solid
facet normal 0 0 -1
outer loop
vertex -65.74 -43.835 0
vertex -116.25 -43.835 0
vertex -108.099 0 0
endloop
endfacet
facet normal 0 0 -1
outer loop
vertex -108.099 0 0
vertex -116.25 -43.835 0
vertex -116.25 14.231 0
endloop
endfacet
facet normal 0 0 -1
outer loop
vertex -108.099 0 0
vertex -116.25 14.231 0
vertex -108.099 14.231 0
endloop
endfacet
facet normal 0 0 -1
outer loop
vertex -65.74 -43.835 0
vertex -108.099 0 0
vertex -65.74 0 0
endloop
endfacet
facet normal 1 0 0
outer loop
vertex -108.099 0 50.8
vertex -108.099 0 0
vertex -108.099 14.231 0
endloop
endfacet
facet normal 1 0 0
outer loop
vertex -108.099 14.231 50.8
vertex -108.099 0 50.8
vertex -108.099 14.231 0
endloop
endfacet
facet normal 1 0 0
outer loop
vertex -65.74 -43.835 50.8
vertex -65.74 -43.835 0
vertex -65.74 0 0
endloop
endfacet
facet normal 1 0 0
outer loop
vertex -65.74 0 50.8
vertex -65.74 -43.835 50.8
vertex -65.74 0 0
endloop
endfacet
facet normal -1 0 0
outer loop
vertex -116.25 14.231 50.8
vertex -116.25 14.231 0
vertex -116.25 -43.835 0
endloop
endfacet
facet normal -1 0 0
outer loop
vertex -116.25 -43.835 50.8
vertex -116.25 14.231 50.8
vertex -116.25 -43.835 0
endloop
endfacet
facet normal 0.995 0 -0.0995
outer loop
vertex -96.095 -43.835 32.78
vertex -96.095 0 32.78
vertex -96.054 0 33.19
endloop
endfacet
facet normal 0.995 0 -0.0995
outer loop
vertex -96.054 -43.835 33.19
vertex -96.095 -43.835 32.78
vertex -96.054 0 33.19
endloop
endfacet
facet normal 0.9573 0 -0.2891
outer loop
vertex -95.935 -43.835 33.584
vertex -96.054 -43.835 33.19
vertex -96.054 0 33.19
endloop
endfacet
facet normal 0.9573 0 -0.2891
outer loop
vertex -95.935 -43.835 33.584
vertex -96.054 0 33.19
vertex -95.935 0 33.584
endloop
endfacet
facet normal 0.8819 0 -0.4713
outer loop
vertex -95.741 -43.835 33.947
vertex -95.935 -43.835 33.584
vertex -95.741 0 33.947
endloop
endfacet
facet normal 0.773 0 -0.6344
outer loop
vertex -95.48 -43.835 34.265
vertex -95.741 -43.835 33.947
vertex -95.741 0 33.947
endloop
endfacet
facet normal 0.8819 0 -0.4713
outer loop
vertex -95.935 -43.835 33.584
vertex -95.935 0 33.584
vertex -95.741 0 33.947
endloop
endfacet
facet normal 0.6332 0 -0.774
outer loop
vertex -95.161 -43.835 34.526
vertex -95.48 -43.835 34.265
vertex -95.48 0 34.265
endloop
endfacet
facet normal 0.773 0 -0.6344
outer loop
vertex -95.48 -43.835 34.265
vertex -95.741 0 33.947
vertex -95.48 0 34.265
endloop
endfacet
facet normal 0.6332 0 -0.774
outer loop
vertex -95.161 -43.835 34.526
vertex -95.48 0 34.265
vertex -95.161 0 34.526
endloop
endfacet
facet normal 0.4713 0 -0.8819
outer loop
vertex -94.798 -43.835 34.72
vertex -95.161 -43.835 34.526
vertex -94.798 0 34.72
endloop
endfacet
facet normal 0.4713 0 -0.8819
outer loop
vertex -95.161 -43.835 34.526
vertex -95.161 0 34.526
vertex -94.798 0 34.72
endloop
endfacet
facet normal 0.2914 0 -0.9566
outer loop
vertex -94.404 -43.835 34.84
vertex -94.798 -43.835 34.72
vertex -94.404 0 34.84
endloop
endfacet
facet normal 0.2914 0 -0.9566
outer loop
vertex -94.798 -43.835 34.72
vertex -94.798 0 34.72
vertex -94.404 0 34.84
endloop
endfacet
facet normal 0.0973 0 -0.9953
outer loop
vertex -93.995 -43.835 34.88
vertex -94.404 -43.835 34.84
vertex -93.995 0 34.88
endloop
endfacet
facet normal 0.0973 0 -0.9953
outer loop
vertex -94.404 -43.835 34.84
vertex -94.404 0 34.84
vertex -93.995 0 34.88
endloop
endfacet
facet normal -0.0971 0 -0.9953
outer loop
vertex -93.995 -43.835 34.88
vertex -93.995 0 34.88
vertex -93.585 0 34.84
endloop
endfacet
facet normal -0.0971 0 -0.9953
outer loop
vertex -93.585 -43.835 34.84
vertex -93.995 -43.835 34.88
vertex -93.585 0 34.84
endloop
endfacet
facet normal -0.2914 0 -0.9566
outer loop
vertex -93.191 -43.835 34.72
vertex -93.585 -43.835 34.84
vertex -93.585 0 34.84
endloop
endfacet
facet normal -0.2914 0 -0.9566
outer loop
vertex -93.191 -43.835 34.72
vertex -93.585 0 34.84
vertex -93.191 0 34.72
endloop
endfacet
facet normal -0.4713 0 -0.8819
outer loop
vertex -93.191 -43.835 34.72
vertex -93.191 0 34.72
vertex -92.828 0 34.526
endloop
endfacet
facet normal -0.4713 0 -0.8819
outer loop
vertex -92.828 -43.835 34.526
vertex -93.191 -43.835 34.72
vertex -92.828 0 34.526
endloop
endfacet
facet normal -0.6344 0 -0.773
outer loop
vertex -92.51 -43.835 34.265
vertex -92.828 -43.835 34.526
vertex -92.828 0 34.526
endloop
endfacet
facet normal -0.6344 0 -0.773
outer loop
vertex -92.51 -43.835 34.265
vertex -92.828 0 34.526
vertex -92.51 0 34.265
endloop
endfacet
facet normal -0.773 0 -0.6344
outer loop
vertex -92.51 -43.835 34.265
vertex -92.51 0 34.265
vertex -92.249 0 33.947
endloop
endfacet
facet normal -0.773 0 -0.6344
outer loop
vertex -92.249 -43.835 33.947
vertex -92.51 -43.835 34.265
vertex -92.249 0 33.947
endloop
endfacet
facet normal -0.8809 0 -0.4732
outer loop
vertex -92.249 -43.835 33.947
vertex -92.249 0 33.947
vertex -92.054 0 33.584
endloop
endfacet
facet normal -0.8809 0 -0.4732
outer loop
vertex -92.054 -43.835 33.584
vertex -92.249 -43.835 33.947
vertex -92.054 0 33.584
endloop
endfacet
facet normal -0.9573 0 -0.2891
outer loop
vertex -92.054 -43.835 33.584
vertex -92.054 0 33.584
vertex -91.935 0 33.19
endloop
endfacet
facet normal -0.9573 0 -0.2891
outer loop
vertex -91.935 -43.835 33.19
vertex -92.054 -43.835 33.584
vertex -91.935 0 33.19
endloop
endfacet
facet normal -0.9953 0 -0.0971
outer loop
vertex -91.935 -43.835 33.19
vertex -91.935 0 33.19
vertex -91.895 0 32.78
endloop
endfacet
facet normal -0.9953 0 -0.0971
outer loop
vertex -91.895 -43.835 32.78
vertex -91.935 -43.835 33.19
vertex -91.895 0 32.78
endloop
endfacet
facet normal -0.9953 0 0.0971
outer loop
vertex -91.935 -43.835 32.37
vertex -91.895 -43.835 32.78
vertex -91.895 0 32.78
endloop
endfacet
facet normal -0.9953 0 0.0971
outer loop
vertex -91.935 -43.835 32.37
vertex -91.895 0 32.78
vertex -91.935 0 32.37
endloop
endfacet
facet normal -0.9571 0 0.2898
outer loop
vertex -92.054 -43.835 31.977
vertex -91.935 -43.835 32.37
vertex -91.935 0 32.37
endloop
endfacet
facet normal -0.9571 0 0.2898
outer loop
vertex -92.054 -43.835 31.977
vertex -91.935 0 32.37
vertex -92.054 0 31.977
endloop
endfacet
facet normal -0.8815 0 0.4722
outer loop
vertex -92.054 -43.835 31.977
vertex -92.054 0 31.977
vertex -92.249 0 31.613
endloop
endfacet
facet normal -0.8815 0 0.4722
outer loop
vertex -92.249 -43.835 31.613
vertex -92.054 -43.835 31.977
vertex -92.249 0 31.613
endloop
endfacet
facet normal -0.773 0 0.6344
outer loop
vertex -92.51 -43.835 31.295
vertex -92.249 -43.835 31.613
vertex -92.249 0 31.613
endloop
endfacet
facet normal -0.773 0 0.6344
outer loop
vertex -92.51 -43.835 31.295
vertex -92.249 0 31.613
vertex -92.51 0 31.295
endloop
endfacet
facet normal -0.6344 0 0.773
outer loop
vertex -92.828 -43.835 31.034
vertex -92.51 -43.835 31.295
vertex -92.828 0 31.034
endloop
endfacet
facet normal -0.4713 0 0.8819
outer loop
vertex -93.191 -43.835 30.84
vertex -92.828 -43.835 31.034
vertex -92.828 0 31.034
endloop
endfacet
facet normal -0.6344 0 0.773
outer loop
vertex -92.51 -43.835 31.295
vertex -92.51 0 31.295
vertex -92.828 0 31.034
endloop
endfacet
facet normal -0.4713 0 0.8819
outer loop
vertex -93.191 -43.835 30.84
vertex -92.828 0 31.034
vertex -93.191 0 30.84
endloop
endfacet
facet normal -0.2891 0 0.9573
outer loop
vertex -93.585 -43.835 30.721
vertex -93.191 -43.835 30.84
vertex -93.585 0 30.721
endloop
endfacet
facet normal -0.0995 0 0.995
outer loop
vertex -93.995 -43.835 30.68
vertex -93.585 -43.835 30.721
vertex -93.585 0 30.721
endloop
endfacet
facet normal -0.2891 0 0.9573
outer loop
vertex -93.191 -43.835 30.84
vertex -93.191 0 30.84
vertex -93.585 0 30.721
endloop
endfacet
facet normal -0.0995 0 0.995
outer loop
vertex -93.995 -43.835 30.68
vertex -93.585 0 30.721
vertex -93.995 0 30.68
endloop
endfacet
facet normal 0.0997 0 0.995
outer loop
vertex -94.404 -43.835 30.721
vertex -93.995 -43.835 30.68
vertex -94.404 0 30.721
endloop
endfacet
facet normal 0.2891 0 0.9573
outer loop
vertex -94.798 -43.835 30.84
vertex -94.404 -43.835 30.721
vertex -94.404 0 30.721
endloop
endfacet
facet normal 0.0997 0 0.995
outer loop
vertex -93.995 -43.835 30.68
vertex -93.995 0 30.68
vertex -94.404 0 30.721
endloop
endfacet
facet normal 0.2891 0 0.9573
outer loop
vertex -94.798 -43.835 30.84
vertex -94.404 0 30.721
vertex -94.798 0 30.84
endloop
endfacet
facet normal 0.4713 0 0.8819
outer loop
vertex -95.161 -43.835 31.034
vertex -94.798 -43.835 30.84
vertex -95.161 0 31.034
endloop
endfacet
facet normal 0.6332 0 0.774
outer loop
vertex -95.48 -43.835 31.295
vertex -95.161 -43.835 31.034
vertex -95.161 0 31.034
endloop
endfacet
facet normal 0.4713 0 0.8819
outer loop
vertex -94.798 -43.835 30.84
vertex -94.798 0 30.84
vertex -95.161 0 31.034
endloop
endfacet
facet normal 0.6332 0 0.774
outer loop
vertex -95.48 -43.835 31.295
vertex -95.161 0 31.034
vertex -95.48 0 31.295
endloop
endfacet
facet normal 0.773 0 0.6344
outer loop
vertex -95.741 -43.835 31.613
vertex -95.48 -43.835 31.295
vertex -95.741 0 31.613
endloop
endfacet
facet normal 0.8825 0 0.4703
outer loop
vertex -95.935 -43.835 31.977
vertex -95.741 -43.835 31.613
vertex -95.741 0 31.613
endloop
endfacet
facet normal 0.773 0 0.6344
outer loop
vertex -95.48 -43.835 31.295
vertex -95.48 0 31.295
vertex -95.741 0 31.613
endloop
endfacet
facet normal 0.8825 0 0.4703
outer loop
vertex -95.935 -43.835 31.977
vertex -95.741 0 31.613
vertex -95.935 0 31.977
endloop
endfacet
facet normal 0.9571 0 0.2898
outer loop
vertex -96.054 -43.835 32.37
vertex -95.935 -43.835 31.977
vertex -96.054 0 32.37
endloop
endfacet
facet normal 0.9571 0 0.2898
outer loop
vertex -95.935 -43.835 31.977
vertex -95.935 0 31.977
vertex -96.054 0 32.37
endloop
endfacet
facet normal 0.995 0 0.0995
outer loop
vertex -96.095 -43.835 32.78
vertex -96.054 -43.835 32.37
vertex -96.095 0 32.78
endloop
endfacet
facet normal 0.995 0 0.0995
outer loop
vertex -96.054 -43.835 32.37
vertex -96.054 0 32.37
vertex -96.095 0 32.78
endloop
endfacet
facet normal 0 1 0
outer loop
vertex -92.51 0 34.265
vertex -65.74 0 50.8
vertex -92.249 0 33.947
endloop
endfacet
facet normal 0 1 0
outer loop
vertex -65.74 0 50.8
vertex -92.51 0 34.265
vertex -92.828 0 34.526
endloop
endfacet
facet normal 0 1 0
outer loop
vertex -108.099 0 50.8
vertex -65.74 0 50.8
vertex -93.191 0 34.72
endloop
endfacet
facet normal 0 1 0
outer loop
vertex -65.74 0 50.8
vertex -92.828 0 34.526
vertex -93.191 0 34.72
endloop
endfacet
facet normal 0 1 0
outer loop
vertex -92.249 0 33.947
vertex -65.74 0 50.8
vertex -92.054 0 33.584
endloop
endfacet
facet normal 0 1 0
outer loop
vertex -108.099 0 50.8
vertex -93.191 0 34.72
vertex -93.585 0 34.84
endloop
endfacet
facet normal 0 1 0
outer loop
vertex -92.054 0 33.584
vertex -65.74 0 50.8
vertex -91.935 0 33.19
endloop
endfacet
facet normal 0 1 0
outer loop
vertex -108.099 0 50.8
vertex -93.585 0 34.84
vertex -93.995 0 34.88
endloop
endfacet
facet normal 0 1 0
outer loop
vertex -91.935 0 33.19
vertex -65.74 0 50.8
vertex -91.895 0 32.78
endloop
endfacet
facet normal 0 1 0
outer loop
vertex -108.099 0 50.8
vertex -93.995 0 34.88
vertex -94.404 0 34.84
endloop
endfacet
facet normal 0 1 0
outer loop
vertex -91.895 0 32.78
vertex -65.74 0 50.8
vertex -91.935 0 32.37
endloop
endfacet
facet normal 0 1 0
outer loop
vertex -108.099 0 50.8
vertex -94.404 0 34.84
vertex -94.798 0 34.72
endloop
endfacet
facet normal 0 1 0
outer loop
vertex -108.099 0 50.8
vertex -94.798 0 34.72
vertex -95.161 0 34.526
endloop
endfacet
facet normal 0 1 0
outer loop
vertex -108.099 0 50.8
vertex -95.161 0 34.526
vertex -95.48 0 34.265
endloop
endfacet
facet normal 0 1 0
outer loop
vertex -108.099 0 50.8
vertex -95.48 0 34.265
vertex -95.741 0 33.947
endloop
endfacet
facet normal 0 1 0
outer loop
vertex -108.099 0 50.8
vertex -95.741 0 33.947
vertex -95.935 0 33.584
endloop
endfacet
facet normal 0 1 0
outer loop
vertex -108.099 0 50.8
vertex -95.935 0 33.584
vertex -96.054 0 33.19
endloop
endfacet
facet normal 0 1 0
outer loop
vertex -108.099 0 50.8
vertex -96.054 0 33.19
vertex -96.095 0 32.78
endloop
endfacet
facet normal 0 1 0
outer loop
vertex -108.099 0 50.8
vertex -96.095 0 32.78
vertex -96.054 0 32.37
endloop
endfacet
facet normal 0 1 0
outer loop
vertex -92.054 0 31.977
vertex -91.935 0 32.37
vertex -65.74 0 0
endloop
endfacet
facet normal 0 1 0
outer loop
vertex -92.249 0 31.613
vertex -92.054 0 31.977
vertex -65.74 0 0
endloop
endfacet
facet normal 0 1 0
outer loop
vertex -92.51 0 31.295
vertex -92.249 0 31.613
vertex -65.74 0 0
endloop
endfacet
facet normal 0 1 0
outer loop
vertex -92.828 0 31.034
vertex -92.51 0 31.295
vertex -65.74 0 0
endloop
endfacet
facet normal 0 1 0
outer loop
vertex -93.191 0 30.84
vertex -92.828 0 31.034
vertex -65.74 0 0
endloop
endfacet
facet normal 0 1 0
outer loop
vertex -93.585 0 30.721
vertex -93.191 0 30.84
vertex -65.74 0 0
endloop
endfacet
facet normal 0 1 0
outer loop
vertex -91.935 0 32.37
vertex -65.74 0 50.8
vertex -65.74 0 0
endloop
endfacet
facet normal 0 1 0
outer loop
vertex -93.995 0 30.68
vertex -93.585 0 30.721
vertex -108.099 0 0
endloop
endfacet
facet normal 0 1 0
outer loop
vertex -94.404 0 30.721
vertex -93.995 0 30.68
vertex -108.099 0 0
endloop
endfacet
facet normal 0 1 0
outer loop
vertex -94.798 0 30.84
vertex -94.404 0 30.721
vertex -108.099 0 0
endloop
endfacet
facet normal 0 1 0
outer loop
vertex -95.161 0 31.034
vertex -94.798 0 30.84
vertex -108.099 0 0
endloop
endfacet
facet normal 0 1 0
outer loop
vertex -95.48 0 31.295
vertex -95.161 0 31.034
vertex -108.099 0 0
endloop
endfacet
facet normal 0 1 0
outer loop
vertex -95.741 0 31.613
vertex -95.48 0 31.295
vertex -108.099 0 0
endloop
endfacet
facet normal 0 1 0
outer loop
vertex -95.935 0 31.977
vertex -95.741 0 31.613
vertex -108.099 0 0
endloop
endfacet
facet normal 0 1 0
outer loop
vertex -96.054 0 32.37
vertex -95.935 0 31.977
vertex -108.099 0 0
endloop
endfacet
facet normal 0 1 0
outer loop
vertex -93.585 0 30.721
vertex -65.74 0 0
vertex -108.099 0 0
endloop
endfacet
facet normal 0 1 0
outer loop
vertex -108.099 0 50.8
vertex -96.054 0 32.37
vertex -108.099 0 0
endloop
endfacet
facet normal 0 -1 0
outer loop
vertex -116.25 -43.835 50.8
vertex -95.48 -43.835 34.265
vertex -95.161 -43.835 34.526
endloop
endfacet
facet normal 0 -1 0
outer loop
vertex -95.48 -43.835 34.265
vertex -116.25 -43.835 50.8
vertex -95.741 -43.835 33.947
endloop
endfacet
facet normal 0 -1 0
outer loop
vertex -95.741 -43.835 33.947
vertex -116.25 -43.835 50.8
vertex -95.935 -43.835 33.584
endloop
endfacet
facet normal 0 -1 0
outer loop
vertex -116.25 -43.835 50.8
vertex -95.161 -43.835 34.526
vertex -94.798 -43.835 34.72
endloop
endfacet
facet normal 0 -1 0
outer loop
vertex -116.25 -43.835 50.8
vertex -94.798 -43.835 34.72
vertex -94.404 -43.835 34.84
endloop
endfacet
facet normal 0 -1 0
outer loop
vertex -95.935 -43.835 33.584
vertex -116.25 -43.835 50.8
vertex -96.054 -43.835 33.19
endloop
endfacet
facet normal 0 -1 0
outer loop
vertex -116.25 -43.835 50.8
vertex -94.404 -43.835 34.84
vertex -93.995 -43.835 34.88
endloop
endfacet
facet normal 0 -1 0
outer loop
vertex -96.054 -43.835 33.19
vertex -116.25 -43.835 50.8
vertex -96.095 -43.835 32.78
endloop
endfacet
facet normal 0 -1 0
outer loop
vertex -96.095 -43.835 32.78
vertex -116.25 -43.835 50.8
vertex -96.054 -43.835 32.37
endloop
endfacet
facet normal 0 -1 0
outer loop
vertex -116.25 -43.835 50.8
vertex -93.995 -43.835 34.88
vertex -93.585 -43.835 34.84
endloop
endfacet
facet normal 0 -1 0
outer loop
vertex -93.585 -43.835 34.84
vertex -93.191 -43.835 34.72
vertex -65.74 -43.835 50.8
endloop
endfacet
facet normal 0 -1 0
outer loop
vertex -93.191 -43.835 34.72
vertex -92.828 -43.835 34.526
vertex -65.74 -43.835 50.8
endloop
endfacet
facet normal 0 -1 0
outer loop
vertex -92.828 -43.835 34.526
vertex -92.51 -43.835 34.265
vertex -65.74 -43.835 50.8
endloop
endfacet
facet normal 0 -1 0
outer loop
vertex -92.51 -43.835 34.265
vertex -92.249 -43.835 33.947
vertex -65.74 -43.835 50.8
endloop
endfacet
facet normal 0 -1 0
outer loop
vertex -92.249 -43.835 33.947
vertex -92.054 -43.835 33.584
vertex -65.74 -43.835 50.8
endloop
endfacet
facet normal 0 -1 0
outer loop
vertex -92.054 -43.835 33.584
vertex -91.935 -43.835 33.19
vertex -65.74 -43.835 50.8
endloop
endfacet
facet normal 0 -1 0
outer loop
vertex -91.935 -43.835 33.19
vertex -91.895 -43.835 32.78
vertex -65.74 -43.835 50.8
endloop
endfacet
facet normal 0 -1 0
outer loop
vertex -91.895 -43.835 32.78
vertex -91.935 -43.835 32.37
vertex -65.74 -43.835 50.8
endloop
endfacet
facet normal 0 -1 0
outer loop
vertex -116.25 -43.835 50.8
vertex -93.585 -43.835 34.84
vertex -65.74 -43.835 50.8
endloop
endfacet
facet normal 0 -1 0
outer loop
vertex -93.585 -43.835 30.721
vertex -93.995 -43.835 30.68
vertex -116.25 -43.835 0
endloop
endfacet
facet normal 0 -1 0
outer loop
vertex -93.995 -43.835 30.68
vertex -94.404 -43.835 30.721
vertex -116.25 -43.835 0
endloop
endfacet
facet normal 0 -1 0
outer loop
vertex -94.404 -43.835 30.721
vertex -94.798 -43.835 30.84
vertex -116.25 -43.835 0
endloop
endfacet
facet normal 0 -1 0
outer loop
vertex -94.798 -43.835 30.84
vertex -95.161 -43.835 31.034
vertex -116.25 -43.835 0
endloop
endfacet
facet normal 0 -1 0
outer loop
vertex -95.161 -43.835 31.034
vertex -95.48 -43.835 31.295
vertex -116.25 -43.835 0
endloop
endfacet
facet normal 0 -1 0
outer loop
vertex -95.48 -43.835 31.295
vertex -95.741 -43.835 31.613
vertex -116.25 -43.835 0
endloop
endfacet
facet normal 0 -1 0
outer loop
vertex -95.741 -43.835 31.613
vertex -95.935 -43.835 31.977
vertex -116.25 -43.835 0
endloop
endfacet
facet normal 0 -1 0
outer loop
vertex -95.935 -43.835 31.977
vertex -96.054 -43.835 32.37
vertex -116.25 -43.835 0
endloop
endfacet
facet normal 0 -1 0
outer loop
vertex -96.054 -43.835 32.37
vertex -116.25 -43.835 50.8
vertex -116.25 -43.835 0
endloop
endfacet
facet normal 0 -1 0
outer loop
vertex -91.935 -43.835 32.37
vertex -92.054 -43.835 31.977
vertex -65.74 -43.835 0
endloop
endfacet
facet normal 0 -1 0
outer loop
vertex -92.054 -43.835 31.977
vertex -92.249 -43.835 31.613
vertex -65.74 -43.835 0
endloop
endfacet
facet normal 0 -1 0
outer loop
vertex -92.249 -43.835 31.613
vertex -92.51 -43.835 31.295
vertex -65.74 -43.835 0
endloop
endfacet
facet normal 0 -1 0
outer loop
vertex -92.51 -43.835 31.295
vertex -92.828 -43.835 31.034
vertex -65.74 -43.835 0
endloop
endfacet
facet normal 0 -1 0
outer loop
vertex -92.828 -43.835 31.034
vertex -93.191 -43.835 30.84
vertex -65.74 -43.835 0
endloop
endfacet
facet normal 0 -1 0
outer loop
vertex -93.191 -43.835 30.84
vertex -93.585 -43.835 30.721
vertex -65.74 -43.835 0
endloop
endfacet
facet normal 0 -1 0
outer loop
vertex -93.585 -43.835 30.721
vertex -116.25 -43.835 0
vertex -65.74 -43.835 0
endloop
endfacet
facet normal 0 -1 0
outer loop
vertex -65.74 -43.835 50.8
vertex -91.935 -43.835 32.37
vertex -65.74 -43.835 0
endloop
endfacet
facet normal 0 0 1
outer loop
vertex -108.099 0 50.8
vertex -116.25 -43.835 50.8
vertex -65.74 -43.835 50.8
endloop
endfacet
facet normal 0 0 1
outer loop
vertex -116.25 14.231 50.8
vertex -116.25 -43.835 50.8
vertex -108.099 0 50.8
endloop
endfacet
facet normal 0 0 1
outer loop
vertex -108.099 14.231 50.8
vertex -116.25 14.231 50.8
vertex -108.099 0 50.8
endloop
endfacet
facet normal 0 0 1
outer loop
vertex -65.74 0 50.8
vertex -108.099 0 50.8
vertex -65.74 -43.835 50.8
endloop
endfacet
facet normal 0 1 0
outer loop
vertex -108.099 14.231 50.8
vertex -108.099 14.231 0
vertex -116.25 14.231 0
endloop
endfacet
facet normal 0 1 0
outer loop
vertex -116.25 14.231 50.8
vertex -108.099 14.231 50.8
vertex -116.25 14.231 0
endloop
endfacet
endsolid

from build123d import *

# Parameters (mm, degrees)
F1_DEPTH = 50.8
F3_D     = 4.2


with BuildPart() as f1:
    # F0 (on Top) → F1 (new body)
    with BuildSketch(Plane.XY):
        Polygon((-108.0991402268, 14.2310541123), (-116.2496432662, 14.2310541123), (-116.2496432662, -43.835349381), (-65.739735961, -43.835349381), (-65.739735961, 0), (-108.0991402268, 0), align=None)
    extrude(amount=F1_DEPTH)

    # F3 (through all)
    with Locations(Plane.XZ.offset(43.835349381)):
        with Locations((-93.9946100116, 32.7801704407)):
            Hole(F3_D / 2)


solid = f1.part
